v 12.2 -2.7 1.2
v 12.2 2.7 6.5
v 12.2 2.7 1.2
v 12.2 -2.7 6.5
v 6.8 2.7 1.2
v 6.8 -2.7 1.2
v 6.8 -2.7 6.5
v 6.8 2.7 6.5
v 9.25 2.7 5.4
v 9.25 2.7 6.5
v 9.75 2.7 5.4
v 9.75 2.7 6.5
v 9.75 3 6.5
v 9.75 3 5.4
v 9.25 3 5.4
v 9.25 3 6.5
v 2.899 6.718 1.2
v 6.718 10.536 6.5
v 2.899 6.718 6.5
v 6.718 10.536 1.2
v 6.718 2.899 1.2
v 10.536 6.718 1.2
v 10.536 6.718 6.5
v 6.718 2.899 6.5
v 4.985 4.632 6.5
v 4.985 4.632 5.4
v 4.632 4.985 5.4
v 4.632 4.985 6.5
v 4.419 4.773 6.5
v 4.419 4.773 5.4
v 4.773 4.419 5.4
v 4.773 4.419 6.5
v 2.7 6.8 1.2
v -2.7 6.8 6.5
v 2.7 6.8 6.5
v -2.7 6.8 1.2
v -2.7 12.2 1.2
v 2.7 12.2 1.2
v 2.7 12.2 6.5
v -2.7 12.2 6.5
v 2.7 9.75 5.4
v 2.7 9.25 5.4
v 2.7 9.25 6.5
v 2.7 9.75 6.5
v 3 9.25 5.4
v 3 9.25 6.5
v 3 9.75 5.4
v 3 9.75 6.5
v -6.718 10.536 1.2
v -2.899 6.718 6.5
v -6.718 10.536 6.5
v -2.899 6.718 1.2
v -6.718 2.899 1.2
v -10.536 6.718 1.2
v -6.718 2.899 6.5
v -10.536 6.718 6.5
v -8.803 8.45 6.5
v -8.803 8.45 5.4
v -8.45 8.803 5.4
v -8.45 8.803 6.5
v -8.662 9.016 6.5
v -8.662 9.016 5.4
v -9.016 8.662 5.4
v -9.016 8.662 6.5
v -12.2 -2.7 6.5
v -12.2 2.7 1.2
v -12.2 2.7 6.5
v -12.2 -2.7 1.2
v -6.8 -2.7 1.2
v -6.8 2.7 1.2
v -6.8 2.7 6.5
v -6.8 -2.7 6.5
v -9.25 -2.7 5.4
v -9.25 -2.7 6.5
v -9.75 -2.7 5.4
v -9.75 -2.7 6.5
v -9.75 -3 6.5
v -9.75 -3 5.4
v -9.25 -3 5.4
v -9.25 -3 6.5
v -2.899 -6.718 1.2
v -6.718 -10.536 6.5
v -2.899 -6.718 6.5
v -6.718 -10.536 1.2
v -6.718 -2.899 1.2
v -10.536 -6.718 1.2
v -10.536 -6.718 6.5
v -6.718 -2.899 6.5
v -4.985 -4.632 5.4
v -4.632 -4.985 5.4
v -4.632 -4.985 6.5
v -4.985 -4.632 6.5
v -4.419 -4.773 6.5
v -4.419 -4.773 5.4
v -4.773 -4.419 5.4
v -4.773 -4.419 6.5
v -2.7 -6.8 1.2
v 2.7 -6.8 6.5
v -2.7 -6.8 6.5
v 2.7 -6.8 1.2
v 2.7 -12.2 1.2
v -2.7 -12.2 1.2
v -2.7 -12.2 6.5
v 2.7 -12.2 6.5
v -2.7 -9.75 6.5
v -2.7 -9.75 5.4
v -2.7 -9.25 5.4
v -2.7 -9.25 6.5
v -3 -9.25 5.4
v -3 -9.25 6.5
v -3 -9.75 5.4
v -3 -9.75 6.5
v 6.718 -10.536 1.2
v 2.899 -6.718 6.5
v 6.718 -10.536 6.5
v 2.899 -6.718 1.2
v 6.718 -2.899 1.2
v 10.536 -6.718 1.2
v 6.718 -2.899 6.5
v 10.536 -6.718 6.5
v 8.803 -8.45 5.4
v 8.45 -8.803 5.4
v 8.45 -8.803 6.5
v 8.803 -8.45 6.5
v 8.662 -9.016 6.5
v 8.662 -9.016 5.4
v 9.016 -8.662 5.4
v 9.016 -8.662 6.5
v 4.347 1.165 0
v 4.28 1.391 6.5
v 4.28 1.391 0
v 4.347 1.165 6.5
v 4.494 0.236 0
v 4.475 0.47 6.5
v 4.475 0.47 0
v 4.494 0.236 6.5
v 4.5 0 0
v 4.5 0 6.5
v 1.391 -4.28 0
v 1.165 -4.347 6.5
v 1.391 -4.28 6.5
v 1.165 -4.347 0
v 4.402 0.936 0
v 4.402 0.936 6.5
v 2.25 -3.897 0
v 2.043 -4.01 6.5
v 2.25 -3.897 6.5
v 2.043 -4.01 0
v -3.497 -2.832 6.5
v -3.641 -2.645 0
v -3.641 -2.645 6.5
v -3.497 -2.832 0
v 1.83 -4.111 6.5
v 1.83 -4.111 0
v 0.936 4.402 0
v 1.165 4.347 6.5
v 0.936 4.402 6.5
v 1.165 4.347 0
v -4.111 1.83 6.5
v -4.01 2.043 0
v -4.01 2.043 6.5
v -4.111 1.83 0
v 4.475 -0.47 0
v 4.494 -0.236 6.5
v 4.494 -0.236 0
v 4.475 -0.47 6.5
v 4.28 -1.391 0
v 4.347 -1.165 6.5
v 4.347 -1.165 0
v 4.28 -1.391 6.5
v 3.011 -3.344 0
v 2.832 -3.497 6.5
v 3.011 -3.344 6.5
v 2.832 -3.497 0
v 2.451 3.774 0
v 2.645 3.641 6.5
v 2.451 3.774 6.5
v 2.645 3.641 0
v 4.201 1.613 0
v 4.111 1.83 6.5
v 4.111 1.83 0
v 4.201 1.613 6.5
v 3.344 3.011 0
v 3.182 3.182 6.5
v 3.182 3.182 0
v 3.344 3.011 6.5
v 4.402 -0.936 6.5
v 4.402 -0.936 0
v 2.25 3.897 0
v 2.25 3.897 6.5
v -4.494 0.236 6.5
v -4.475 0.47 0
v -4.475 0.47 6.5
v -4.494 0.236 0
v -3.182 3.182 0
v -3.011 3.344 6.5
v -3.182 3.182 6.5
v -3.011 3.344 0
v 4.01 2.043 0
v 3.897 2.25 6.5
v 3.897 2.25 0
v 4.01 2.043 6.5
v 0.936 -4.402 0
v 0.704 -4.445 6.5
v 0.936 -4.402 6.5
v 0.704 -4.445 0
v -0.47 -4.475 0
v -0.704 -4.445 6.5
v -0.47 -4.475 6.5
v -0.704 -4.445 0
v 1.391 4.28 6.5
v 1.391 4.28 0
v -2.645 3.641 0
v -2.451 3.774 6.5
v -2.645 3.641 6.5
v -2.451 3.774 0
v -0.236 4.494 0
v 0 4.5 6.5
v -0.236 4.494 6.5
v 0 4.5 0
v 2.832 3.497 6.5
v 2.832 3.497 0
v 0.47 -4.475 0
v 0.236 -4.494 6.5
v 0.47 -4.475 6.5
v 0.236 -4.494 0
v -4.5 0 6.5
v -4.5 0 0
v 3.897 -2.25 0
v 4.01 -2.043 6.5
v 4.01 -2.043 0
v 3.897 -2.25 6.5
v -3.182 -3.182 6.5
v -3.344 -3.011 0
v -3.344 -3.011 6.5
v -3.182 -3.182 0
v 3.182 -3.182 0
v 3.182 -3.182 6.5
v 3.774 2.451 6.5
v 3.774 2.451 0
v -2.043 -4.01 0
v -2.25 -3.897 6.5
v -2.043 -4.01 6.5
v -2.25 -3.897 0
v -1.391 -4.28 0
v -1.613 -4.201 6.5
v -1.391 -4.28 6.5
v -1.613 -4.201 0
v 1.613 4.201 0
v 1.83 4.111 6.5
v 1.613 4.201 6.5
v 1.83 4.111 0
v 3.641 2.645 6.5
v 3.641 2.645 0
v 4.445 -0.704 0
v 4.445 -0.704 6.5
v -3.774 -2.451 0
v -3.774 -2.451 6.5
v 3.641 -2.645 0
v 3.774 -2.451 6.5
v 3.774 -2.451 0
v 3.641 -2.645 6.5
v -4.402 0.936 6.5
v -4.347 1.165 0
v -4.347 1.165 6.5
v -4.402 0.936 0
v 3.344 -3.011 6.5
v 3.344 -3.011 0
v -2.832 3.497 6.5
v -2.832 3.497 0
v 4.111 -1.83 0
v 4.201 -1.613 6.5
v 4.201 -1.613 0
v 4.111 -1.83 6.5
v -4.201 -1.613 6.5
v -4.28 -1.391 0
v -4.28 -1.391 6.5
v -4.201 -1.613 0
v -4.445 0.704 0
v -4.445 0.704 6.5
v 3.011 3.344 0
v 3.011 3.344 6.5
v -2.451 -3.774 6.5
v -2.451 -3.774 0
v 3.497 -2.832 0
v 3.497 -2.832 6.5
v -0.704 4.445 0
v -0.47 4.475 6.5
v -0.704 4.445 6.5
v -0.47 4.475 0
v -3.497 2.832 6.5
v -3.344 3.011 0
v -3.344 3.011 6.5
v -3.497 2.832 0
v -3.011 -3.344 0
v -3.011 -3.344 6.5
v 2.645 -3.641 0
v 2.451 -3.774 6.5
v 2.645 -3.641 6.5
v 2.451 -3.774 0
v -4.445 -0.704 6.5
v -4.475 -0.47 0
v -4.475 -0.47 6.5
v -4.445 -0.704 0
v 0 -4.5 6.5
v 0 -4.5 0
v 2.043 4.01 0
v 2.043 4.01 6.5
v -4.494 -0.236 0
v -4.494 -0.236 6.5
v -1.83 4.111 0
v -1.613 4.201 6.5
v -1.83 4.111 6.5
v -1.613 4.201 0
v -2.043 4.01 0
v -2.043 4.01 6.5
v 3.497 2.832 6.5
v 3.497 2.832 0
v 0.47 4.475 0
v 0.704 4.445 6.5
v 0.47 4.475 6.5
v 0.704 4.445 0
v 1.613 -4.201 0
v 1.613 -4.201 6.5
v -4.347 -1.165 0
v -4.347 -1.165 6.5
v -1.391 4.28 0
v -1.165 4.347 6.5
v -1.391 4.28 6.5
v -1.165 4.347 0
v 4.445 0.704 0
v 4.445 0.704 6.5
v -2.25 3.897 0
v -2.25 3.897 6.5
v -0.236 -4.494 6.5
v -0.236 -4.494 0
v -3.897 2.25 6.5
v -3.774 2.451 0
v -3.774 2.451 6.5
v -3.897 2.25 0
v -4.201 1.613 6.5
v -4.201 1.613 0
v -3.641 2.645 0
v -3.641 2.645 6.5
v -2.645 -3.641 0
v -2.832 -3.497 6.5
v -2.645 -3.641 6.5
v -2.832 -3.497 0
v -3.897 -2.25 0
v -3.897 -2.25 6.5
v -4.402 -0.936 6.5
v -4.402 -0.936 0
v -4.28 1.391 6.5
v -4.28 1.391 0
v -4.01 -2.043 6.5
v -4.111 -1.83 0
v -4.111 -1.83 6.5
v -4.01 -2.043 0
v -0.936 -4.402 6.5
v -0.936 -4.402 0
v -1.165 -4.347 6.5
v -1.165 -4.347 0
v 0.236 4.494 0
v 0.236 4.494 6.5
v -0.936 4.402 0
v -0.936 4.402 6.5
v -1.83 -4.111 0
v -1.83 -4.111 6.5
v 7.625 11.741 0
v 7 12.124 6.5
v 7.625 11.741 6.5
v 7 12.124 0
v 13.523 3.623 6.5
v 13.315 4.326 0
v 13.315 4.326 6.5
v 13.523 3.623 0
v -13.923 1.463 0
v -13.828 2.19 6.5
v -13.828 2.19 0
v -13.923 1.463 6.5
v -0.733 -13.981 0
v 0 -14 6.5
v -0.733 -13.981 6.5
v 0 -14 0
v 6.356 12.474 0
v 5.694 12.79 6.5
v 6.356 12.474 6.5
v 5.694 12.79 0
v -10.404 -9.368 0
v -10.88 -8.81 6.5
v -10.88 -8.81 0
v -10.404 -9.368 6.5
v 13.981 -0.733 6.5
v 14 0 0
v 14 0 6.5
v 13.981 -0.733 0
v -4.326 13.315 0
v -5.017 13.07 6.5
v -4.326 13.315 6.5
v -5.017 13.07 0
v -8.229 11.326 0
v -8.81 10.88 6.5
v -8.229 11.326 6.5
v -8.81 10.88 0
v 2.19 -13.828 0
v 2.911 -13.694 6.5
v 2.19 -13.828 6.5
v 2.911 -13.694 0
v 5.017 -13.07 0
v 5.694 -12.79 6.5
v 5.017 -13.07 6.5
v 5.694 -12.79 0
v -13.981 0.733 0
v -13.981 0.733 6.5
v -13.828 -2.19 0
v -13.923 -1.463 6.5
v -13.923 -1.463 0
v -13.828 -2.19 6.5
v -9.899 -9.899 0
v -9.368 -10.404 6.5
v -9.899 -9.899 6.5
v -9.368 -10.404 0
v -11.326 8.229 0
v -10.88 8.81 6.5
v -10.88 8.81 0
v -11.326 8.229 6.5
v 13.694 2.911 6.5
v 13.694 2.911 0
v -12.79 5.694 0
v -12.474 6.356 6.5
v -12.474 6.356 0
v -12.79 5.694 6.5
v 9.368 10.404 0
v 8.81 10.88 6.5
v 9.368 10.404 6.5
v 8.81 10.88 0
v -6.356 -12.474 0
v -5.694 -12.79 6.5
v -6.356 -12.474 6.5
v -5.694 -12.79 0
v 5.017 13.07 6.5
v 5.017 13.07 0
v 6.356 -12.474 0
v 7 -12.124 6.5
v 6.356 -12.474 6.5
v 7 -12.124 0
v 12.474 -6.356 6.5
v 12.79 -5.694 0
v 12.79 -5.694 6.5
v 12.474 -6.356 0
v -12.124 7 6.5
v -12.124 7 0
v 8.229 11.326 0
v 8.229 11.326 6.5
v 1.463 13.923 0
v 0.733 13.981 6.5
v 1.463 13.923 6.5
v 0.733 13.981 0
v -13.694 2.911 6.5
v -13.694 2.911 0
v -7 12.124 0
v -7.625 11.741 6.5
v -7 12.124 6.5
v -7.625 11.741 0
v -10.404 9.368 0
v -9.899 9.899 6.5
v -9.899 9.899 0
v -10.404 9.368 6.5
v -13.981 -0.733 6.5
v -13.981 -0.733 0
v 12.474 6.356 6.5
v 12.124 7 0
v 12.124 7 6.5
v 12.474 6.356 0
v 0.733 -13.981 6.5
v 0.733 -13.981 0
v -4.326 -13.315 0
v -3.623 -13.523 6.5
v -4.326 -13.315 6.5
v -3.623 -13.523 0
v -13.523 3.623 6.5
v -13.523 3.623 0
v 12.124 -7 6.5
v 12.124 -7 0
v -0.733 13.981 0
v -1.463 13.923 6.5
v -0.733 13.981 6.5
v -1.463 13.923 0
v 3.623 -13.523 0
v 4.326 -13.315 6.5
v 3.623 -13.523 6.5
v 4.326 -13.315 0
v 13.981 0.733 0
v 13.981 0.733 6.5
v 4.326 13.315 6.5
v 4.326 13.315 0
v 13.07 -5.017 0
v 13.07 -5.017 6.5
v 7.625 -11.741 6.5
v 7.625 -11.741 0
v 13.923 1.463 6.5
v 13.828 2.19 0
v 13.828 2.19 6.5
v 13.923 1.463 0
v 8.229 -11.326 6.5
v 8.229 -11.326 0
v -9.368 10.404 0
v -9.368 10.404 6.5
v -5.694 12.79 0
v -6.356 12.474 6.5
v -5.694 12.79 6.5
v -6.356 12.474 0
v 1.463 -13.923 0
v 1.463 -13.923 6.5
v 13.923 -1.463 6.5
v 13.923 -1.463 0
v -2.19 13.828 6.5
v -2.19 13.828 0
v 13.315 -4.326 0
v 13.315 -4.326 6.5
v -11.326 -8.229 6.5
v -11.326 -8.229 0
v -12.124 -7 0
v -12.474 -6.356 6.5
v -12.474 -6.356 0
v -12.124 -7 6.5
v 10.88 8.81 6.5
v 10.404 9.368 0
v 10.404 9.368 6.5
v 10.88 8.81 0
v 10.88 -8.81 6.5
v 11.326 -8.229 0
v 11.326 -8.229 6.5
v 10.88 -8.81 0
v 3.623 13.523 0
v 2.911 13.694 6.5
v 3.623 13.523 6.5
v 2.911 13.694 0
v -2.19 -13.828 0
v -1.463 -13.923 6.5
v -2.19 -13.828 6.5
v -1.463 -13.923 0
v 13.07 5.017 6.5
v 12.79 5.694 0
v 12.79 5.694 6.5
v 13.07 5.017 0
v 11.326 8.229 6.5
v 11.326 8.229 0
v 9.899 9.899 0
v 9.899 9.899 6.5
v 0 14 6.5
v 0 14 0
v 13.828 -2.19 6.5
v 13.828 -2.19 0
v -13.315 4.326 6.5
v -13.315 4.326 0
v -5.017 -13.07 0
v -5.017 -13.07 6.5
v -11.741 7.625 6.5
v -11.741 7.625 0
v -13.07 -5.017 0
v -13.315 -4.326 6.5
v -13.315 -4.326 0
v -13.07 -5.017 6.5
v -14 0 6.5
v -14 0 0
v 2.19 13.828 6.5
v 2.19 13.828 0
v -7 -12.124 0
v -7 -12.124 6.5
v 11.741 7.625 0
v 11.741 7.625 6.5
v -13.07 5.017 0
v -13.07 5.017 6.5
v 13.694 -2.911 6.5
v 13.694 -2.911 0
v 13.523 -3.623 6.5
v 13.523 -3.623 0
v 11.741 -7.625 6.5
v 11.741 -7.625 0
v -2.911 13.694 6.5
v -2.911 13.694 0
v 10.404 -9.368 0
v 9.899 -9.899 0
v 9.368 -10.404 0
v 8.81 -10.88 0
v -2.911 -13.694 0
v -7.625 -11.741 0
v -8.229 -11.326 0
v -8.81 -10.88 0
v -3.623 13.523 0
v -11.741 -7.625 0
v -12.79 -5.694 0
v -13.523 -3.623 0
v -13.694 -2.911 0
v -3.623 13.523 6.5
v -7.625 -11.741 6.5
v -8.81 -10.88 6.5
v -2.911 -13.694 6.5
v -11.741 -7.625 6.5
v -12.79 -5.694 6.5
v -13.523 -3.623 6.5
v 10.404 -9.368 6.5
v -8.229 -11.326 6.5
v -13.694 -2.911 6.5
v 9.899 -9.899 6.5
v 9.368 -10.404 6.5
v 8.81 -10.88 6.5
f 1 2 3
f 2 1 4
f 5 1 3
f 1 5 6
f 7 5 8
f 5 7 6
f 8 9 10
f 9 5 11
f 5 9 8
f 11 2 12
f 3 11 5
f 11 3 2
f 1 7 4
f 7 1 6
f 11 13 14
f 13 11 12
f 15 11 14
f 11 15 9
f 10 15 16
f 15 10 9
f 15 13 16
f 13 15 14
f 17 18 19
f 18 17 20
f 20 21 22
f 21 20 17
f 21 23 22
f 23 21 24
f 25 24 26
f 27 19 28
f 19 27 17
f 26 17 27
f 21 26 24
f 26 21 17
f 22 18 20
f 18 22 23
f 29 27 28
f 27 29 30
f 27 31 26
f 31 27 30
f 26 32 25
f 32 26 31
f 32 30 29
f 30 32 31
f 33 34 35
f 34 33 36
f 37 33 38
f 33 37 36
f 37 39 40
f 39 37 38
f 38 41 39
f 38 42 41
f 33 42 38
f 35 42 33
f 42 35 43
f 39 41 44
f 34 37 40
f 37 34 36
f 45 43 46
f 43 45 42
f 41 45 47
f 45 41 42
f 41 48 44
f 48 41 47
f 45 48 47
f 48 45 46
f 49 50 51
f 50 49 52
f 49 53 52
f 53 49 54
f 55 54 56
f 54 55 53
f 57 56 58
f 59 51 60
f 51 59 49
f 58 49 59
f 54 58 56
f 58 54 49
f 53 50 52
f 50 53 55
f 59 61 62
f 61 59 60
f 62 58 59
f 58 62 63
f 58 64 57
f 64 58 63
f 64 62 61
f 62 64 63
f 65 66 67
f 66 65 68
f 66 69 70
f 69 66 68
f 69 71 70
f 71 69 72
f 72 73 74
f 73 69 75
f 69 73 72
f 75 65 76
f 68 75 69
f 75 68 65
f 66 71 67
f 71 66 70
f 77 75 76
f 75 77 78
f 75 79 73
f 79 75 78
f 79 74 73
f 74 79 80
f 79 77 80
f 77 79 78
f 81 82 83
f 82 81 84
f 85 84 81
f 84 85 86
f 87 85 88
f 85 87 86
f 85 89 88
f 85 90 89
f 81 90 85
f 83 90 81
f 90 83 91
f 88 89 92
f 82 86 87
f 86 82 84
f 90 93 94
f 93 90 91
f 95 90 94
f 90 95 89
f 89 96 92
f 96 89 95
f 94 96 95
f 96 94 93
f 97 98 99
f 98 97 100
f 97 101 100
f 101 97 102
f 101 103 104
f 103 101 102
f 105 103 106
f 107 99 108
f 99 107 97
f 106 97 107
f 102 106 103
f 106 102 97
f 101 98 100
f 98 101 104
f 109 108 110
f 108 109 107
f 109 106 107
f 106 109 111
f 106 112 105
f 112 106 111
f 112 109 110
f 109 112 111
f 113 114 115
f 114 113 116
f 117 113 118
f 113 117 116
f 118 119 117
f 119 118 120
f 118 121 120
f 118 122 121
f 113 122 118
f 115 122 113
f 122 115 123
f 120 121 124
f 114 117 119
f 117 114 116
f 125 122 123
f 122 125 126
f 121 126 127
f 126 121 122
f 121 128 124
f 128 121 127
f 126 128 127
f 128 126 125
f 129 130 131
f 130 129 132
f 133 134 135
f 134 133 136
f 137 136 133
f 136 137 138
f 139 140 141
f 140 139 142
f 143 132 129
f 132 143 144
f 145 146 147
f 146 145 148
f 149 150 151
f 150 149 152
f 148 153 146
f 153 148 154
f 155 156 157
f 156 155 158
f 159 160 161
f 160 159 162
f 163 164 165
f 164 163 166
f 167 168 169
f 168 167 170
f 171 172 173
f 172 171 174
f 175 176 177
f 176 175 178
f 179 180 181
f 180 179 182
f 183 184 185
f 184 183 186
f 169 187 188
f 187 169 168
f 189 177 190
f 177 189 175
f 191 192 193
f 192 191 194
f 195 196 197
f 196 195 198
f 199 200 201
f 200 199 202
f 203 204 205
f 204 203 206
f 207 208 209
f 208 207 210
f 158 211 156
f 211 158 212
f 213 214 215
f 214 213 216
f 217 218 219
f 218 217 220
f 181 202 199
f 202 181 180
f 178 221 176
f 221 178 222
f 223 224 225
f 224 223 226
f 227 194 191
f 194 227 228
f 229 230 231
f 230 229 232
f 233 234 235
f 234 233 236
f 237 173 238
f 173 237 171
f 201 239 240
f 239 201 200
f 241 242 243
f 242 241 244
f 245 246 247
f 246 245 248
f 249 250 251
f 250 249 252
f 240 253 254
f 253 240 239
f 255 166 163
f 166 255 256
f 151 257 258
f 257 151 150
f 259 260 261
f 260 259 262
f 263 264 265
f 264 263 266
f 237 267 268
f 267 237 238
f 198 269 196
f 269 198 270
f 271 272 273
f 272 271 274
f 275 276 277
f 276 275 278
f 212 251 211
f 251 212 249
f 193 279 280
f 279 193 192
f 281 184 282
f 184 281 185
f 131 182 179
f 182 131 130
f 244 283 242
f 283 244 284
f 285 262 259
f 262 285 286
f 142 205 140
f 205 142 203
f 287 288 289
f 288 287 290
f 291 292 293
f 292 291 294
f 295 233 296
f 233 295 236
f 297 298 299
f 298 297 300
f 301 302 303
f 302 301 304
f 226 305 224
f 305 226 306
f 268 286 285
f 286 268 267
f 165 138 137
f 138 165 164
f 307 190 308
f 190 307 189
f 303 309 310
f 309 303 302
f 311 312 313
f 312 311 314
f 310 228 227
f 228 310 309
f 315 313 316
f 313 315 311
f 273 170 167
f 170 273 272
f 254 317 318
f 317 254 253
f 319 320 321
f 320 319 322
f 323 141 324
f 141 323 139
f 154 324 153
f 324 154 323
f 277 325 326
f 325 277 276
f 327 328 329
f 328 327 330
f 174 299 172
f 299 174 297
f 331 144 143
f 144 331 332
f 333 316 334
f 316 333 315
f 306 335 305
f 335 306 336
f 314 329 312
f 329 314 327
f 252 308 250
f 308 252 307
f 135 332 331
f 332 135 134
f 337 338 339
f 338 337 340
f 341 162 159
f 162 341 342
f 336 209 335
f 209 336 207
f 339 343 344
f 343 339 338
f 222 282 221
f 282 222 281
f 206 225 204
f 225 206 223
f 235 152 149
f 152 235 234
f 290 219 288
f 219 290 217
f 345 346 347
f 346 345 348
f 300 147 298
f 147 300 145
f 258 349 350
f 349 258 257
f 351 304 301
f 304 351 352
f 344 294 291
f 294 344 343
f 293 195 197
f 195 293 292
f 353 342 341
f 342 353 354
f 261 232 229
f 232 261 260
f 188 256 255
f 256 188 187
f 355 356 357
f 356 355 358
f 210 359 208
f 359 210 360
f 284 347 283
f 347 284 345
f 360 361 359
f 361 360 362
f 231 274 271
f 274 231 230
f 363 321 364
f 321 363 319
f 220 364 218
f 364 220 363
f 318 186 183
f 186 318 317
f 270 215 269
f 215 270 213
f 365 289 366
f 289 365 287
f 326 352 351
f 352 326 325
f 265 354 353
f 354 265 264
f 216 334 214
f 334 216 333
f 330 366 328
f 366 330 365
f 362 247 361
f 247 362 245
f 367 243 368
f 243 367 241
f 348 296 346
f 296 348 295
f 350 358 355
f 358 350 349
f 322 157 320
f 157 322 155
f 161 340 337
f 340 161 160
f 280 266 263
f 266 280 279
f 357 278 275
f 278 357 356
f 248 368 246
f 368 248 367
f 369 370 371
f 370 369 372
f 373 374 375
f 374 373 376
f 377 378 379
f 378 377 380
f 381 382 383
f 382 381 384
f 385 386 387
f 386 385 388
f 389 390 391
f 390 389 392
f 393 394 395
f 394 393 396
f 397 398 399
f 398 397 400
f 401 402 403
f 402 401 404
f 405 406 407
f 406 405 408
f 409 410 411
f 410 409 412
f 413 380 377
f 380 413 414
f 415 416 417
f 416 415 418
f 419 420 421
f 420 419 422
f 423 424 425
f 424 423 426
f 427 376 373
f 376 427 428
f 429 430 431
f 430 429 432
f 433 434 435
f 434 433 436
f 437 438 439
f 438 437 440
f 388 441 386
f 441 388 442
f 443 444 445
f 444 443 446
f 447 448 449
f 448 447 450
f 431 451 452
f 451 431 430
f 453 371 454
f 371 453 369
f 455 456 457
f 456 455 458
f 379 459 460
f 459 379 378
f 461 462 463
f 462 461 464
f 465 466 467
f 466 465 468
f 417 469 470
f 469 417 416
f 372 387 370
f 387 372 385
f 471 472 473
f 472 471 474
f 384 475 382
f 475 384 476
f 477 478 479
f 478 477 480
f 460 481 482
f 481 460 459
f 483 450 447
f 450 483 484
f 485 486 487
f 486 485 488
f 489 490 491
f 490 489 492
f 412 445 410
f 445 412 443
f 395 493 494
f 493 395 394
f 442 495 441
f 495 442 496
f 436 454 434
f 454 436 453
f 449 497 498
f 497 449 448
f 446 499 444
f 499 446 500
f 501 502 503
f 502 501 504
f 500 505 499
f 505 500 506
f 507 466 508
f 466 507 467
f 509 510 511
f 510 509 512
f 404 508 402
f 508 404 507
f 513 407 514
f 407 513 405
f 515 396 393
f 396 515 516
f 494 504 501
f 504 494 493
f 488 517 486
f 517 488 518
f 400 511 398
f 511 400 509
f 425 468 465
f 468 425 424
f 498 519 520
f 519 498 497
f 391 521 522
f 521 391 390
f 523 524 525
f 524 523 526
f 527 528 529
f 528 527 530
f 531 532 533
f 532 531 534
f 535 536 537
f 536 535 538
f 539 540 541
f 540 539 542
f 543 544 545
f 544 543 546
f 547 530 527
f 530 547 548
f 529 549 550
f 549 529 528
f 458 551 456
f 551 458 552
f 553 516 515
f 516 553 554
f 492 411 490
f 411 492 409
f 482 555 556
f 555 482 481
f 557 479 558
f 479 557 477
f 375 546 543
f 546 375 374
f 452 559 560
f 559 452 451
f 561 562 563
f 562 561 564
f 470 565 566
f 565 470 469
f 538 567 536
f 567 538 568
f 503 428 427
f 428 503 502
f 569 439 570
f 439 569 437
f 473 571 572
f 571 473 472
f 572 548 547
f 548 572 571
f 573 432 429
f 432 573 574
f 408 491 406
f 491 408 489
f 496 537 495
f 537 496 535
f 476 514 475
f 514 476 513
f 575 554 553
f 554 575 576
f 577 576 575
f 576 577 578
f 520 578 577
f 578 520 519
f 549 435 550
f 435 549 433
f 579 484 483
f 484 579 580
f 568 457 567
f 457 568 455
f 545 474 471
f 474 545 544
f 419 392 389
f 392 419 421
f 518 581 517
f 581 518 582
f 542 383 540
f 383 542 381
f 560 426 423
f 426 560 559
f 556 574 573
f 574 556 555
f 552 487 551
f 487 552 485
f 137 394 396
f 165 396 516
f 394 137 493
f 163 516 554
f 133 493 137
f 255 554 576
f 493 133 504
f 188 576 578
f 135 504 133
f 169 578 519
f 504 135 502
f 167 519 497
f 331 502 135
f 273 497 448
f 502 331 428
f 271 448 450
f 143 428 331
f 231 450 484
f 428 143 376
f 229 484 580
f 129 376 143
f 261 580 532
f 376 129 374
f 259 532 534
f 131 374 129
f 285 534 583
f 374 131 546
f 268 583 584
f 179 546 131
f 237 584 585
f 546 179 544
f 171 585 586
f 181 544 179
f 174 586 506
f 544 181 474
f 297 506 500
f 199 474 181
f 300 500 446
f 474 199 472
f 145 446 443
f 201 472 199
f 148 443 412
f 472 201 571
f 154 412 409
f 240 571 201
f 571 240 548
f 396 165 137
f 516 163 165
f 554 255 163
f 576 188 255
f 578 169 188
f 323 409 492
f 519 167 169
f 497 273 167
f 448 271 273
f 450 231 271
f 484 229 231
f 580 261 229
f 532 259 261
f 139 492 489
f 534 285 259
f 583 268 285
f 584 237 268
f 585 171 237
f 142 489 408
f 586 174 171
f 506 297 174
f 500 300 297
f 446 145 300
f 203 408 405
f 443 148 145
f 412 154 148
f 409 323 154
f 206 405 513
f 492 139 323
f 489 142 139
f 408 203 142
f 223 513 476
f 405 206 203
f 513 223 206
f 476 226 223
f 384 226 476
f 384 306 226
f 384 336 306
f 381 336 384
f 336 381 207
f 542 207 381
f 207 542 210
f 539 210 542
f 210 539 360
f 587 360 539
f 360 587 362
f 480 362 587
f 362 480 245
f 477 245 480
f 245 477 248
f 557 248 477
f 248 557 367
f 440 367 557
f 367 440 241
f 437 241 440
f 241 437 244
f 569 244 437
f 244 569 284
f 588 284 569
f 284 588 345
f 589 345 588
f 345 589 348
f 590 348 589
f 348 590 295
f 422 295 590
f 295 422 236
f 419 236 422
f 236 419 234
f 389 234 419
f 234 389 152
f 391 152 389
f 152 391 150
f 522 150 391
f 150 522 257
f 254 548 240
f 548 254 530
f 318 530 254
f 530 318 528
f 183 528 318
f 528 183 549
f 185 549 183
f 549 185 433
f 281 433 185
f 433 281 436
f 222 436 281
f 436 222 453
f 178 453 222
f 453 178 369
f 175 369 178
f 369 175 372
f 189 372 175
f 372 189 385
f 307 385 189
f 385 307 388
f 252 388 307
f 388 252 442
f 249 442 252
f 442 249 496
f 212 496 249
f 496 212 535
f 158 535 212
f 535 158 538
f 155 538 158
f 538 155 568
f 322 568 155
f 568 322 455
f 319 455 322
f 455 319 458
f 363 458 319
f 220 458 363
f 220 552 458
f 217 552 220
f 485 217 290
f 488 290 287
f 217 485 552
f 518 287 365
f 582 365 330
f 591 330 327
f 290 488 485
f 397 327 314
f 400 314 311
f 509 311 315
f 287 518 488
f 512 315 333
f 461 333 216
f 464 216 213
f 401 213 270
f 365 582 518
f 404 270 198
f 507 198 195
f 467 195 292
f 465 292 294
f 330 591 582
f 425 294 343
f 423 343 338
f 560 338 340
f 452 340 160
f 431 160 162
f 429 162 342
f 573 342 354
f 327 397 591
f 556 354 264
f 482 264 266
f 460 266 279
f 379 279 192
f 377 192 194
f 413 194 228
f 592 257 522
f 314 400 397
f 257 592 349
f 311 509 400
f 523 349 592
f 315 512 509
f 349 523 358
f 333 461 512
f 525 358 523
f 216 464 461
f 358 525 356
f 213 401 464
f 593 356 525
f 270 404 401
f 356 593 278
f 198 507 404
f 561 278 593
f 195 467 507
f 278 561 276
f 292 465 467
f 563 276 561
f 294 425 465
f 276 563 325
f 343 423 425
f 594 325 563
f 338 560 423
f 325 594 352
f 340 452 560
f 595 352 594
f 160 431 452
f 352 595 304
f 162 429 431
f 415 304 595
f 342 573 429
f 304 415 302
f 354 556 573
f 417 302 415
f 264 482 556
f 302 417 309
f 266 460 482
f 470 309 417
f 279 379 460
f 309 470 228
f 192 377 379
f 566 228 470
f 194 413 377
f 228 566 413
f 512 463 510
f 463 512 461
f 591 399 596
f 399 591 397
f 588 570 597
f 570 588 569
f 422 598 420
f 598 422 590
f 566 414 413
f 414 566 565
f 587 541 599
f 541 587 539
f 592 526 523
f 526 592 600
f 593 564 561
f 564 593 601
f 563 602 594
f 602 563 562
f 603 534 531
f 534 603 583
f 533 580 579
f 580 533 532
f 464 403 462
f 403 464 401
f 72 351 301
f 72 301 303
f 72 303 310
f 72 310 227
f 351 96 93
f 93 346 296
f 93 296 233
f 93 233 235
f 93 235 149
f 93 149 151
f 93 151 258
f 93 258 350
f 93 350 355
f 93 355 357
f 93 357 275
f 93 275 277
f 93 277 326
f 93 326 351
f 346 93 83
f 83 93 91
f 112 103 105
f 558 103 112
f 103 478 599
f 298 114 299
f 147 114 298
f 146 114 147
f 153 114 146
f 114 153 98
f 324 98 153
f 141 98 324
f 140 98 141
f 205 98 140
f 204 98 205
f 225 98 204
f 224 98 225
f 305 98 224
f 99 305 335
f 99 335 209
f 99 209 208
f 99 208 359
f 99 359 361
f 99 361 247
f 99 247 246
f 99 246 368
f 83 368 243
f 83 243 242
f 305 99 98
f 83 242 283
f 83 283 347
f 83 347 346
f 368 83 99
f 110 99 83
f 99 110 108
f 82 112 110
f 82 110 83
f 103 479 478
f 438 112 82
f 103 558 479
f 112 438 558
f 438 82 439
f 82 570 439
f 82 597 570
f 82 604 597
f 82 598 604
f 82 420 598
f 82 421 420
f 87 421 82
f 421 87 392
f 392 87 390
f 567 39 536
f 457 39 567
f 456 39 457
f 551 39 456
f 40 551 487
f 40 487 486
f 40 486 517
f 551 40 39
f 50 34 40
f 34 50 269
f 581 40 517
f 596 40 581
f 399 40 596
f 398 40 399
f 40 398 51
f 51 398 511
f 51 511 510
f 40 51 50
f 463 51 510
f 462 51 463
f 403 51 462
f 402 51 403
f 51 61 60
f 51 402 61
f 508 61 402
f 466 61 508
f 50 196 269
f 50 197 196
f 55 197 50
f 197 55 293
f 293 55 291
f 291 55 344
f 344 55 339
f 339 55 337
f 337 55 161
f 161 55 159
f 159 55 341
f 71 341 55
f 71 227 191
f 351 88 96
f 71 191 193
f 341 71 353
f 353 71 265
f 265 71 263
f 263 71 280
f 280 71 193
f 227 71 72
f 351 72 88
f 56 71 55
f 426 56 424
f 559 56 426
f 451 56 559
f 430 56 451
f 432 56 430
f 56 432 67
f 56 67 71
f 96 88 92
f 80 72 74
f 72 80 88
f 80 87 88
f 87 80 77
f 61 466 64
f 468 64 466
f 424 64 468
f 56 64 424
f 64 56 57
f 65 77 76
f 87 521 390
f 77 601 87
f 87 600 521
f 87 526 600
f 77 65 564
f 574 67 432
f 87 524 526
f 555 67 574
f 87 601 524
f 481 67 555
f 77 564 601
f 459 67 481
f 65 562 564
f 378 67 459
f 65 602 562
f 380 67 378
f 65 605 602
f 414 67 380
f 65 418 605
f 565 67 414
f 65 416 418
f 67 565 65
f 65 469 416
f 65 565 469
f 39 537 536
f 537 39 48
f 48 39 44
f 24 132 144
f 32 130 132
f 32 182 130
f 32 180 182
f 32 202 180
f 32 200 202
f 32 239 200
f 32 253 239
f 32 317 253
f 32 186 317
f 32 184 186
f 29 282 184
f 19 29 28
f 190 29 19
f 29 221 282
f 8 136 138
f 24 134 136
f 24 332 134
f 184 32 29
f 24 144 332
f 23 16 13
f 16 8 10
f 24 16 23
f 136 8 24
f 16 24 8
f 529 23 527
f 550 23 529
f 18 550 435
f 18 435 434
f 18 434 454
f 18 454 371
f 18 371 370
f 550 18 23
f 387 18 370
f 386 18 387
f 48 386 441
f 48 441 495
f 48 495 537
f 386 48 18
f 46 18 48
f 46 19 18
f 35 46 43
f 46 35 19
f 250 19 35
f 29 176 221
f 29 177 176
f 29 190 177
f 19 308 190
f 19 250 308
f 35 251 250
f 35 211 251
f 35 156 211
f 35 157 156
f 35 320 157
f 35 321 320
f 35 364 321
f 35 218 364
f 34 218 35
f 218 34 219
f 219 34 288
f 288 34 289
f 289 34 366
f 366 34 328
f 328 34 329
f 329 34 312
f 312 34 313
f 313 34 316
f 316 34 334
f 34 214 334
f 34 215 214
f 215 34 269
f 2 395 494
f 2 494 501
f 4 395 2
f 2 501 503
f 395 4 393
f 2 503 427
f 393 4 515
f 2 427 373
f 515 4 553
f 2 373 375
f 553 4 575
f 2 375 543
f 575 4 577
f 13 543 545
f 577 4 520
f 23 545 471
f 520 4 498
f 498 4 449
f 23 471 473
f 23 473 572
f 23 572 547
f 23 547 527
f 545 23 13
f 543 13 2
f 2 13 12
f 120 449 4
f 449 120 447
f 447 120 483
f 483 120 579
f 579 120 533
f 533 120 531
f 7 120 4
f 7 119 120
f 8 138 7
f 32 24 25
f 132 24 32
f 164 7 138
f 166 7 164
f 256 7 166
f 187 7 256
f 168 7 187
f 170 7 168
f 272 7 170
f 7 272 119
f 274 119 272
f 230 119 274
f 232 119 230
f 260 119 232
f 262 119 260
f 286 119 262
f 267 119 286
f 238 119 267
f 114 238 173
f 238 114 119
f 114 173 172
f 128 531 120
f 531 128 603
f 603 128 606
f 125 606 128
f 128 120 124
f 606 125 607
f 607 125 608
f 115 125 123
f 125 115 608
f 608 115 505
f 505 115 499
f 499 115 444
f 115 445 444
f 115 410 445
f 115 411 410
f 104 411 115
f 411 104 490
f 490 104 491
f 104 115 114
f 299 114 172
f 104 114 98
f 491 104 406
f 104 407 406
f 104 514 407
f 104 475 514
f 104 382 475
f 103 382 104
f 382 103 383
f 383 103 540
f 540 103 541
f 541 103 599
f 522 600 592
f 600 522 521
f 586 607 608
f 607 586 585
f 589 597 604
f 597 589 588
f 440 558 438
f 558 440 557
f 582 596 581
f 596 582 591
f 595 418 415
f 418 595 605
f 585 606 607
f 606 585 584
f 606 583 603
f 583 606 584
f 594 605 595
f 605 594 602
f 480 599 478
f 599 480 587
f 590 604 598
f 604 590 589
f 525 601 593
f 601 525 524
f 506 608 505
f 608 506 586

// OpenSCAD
// halbach_M8.scad, V. Ziemann, 240829
M=8;           // number of cubes
hcube=5;       // size of cube
k=3;           // tumble factor: k=2 -> dipole, k=3 -> quadrupole
h2=hcube+0.4;  // slightly bigger hole for the cubes
difference() {
  cylinder(h=hcube+1.5,r=14,$fn=120);    // cylinder
  translate([0,0,-0.5]) {
    cylinder(h=10*hcube,r=4.5,$fn=120);  // hole in middle
    for (j=[0:M-1]) {  // loop over cubes
      rotate([0,0,j*360/M]) {translate([9.5,0,1.5]) {
        rotate([0,0,(k-1)*j*360/M]) {
          translate([-2.7,-2.7,0.2]) cube([5.4,5.4,5.4]);      // big holes
          translate([-0.25,h2/2-0.2,h2-1]) cube([0.5,0.5,10]); // notches
        }
      }}  // rotate+translate
    }  // for
  }  // translate
} // difference
